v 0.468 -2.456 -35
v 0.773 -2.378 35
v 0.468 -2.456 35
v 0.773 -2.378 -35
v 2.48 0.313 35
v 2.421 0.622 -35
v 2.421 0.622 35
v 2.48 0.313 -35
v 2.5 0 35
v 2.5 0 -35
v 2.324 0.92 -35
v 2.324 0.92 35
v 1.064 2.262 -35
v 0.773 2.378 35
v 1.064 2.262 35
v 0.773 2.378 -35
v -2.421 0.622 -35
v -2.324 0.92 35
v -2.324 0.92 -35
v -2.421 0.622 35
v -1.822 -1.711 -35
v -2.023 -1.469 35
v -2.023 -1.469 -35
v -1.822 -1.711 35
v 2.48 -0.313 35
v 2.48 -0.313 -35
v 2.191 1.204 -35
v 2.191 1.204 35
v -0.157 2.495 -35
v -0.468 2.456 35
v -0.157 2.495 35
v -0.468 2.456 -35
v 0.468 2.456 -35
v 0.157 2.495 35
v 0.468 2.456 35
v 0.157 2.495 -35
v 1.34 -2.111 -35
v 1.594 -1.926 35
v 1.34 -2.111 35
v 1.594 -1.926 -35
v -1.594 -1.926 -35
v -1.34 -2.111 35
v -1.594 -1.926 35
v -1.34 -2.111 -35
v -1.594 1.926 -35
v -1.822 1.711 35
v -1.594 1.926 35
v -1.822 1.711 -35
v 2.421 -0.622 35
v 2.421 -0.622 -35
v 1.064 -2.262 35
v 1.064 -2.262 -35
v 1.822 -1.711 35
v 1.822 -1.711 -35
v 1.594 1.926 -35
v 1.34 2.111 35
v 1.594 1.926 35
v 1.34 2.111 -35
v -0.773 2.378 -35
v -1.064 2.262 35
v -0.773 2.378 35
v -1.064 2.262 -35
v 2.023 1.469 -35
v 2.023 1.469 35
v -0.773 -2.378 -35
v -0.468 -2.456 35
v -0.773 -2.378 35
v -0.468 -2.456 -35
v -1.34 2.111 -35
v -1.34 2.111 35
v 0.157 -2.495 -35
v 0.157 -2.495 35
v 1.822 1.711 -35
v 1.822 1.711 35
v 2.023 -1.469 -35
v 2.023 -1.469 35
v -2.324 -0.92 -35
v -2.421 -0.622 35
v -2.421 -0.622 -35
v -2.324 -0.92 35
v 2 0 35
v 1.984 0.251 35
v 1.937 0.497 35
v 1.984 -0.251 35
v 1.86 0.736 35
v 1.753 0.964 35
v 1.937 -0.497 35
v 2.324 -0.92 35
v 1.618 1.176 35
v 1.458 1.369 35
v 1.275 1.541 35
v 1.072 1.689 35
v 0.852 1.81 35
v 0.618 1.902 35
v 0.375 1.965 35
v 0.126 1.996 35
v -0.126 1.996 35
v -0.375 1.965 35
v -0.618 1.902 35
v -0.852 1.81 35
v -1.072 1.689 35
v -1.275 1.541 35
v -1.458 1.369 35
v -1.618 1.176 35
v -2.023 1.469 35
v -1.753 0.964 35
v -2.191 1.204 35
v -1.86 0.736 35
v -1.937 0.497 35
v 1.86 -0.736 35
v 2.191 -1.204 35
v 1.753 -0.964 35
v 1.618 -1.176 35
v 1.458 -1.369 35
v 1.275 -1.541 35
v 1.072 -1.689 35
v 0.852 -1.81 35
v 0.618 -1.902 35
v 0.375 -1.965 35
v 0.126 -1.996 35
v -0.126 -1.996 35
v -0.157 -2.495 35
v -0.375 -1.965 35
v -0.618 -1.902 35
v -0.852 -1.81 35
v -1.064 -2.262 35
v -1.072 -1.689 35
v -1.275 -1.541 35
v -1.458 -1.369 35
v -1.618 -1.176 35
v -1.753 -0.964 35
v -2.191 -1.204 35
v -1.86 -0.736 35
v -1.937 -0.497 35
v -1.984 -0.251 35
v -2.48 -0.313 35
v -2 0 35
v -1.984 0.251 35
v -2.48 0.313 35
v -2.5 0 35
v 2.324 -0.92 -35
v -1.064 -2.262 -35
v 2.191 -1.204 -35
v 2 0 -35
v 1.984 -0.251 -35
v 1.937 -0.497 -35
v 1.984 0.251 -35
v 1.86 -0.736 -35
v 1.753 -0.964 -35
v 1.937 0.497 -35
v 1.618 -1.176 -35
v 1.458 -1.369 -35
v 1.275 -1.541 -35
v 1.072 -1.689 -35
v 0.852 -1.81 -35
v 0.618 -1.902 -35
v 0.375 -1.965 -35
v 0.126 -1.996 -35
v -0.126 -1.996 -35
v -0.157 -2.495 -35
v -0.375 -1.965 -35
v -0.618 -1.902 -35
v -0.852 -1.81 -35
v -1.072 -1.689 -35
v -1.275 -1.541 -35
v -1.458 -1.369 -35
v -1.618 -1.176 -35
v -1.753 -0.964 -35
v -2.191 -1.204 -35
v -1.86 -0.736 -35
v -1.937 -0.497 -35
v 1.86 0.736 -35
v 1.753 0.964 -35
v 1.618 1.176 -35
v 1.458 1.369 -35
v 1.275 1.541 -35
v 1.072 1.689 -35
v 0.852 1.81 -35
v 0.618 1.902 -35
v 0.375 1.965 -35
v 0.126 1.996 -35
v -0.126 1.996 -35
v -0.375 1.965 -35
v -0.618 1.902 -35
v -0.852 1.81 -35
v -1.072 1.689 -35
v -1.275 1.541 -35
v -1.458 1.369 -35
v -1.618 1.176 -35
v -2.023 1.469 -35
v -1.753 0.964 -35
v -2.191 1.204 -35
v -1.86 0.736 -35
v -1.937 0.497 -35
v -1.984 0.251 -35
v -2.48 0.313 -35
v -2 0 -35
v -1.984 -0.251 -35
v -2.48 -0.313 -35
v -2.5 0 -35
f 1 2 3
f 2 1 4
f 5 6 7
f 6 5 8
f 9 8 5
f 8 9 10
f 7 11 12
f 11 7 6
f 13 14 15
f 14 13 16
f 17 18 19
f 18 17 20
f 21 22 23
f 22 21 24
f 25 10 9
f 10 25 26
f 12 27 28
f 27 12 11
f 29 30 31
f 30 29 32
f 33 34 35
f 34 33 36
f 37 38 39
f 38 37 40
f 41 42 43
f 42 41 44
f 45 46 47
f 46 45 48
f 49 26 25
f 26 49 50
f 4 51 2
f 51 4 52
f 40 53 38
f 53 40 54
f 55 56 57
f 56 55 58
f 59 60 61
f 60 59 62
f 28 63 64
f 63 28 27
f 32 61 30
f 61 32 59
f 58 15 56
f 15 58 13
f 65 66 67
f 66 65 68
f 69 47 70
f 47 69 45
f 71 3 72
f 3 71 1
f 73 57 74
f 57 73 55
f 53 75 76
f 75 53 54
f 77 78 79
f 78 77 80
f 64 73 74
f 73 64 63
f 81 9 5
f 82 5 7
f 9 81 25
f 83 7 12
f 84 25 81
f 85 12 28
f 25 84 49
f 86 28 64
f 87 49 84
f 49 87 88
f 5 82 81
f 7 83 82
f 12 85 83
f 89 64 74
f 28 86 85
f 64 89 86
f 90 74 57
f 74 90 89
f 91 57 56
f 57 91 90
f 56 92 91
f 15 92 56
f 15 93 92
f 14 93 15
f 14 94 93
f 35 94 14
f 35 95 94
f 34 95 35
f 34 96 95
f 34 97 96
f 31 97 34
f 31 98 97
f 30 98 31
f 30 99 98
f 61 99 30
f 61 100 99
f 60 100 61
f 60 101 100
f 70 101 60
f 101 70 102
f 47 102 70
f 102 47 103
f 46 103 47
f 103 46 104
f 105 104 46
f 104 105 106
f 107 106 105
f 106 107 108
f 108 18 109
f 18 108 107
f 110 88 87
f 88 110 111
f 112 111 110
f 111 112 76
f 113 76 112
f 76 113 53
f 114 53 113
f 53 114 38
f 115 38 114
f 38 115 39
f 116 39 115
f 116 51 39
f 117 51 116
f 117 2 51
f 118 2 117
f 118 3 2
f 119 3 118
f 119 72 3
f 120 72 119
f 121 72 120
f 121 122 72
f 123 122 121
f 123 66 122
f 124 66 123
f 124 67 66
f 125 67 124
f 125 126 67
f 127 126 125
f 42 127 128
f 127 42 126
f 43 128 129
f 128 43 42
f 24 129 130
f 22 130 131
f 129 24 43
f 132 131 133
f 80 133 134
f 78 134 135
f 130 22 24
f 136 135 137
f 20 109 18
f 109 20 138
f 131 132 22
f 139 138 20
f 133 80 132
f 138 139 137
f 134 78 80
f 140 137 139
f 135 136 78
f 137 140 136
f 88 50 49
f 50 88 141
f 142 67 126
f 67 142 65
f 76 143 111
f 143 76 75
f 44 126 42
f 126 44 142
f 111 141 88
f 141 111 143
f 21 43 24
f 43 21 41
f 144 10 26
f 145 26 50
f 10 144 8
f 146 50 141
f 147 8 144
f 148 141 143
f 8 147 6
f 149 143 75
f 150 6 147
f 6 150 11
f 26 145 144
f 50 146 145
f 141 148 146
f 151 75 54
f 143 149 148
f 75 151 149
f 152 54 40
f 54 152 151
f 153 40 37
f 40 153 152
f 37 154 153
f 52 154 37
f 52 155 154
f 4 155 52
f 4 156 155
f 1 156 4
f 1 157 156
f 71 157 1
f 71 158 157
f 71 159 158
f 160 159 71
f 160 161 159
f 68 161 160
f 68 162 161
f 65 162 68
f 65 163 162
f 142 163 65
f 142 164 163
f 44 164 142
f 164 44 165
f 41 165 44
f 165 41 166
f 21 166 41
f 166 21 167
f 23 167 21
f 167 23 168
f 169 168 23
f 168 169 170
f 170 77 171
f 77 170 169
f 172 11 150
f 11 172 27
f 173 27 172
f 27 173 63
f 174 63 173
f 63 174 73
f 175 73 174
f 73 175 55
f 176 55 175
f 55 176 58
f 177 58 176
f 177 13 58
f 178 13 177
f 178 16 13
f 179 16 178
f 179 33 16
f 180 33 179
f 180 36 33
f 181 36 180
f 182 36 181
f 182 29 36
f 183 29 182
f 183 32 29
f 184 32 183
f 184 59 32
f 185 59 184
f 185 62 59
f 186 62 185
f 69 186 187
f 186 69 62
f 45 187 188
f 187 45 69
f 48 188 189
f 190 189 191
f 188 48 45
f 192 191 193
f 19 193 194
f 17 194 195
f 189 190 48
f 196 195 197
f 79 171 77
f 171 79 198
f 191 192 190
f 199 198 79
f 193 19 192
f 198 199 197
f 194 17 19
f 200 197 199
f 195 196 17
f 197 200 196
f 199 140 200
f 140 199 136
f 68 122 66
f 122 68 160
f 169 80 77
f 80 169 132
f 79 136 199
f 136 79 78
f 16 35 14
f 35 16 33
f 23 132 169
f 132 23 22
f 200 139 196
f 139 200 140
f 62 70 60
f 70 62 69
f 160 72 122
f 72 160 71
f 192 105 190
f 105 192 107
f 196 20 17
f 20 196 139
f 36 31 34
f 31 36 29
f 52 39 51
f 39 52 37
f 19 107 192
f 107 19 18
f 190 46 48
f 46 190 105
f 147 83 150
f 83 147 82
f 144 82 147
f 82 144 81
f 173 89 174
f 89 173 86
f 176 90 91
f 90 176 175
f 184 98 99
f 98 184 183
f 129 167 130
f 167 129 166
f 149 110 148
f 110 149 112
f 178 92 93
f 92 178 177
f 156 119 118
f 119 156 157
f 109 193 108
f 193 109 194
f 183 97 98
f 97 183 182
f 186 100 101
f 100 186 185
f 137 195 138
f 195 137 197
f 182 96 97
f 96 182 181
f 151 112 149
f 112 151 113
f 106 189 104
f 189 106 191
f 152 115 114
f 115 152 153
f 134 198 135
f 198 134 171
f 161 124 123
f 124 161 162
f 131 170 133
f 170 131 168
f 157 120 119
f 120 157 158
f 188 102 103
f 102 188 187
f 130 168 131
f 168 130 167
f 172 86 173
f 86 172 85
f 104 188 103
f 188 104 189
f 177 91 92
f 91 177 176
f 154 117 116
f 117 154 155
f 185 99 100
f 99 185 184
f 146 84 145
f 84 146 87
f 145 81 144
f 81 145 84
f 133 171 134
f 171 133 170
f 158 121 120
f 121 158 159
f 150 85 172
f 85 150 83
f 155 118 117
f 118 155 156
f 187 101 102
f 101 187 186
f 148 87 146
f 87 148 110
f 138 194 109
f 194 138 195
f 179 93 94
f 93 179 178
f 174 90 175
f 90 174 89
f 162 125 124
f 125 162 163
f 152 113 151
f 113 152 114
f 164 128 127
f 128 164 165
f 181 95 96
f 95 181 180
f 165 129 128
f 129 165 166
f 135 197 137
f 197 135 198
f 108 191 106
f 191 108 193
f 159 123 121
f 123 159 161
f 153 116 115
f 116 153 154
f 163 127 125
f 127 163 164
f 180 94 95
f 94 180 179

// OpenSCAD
$fn = 50;


difference() {
	union() {
		translate(v = [0, 0, -35.0000000000]) {
			cylinder(h = 70, r = 2.5000000000);
		}
	}
	union() {
		translate(v = [0, 0, -100.0000000000]) {
			cylinder(h = 200, r = 2.0000000000);
		}
	}
}
